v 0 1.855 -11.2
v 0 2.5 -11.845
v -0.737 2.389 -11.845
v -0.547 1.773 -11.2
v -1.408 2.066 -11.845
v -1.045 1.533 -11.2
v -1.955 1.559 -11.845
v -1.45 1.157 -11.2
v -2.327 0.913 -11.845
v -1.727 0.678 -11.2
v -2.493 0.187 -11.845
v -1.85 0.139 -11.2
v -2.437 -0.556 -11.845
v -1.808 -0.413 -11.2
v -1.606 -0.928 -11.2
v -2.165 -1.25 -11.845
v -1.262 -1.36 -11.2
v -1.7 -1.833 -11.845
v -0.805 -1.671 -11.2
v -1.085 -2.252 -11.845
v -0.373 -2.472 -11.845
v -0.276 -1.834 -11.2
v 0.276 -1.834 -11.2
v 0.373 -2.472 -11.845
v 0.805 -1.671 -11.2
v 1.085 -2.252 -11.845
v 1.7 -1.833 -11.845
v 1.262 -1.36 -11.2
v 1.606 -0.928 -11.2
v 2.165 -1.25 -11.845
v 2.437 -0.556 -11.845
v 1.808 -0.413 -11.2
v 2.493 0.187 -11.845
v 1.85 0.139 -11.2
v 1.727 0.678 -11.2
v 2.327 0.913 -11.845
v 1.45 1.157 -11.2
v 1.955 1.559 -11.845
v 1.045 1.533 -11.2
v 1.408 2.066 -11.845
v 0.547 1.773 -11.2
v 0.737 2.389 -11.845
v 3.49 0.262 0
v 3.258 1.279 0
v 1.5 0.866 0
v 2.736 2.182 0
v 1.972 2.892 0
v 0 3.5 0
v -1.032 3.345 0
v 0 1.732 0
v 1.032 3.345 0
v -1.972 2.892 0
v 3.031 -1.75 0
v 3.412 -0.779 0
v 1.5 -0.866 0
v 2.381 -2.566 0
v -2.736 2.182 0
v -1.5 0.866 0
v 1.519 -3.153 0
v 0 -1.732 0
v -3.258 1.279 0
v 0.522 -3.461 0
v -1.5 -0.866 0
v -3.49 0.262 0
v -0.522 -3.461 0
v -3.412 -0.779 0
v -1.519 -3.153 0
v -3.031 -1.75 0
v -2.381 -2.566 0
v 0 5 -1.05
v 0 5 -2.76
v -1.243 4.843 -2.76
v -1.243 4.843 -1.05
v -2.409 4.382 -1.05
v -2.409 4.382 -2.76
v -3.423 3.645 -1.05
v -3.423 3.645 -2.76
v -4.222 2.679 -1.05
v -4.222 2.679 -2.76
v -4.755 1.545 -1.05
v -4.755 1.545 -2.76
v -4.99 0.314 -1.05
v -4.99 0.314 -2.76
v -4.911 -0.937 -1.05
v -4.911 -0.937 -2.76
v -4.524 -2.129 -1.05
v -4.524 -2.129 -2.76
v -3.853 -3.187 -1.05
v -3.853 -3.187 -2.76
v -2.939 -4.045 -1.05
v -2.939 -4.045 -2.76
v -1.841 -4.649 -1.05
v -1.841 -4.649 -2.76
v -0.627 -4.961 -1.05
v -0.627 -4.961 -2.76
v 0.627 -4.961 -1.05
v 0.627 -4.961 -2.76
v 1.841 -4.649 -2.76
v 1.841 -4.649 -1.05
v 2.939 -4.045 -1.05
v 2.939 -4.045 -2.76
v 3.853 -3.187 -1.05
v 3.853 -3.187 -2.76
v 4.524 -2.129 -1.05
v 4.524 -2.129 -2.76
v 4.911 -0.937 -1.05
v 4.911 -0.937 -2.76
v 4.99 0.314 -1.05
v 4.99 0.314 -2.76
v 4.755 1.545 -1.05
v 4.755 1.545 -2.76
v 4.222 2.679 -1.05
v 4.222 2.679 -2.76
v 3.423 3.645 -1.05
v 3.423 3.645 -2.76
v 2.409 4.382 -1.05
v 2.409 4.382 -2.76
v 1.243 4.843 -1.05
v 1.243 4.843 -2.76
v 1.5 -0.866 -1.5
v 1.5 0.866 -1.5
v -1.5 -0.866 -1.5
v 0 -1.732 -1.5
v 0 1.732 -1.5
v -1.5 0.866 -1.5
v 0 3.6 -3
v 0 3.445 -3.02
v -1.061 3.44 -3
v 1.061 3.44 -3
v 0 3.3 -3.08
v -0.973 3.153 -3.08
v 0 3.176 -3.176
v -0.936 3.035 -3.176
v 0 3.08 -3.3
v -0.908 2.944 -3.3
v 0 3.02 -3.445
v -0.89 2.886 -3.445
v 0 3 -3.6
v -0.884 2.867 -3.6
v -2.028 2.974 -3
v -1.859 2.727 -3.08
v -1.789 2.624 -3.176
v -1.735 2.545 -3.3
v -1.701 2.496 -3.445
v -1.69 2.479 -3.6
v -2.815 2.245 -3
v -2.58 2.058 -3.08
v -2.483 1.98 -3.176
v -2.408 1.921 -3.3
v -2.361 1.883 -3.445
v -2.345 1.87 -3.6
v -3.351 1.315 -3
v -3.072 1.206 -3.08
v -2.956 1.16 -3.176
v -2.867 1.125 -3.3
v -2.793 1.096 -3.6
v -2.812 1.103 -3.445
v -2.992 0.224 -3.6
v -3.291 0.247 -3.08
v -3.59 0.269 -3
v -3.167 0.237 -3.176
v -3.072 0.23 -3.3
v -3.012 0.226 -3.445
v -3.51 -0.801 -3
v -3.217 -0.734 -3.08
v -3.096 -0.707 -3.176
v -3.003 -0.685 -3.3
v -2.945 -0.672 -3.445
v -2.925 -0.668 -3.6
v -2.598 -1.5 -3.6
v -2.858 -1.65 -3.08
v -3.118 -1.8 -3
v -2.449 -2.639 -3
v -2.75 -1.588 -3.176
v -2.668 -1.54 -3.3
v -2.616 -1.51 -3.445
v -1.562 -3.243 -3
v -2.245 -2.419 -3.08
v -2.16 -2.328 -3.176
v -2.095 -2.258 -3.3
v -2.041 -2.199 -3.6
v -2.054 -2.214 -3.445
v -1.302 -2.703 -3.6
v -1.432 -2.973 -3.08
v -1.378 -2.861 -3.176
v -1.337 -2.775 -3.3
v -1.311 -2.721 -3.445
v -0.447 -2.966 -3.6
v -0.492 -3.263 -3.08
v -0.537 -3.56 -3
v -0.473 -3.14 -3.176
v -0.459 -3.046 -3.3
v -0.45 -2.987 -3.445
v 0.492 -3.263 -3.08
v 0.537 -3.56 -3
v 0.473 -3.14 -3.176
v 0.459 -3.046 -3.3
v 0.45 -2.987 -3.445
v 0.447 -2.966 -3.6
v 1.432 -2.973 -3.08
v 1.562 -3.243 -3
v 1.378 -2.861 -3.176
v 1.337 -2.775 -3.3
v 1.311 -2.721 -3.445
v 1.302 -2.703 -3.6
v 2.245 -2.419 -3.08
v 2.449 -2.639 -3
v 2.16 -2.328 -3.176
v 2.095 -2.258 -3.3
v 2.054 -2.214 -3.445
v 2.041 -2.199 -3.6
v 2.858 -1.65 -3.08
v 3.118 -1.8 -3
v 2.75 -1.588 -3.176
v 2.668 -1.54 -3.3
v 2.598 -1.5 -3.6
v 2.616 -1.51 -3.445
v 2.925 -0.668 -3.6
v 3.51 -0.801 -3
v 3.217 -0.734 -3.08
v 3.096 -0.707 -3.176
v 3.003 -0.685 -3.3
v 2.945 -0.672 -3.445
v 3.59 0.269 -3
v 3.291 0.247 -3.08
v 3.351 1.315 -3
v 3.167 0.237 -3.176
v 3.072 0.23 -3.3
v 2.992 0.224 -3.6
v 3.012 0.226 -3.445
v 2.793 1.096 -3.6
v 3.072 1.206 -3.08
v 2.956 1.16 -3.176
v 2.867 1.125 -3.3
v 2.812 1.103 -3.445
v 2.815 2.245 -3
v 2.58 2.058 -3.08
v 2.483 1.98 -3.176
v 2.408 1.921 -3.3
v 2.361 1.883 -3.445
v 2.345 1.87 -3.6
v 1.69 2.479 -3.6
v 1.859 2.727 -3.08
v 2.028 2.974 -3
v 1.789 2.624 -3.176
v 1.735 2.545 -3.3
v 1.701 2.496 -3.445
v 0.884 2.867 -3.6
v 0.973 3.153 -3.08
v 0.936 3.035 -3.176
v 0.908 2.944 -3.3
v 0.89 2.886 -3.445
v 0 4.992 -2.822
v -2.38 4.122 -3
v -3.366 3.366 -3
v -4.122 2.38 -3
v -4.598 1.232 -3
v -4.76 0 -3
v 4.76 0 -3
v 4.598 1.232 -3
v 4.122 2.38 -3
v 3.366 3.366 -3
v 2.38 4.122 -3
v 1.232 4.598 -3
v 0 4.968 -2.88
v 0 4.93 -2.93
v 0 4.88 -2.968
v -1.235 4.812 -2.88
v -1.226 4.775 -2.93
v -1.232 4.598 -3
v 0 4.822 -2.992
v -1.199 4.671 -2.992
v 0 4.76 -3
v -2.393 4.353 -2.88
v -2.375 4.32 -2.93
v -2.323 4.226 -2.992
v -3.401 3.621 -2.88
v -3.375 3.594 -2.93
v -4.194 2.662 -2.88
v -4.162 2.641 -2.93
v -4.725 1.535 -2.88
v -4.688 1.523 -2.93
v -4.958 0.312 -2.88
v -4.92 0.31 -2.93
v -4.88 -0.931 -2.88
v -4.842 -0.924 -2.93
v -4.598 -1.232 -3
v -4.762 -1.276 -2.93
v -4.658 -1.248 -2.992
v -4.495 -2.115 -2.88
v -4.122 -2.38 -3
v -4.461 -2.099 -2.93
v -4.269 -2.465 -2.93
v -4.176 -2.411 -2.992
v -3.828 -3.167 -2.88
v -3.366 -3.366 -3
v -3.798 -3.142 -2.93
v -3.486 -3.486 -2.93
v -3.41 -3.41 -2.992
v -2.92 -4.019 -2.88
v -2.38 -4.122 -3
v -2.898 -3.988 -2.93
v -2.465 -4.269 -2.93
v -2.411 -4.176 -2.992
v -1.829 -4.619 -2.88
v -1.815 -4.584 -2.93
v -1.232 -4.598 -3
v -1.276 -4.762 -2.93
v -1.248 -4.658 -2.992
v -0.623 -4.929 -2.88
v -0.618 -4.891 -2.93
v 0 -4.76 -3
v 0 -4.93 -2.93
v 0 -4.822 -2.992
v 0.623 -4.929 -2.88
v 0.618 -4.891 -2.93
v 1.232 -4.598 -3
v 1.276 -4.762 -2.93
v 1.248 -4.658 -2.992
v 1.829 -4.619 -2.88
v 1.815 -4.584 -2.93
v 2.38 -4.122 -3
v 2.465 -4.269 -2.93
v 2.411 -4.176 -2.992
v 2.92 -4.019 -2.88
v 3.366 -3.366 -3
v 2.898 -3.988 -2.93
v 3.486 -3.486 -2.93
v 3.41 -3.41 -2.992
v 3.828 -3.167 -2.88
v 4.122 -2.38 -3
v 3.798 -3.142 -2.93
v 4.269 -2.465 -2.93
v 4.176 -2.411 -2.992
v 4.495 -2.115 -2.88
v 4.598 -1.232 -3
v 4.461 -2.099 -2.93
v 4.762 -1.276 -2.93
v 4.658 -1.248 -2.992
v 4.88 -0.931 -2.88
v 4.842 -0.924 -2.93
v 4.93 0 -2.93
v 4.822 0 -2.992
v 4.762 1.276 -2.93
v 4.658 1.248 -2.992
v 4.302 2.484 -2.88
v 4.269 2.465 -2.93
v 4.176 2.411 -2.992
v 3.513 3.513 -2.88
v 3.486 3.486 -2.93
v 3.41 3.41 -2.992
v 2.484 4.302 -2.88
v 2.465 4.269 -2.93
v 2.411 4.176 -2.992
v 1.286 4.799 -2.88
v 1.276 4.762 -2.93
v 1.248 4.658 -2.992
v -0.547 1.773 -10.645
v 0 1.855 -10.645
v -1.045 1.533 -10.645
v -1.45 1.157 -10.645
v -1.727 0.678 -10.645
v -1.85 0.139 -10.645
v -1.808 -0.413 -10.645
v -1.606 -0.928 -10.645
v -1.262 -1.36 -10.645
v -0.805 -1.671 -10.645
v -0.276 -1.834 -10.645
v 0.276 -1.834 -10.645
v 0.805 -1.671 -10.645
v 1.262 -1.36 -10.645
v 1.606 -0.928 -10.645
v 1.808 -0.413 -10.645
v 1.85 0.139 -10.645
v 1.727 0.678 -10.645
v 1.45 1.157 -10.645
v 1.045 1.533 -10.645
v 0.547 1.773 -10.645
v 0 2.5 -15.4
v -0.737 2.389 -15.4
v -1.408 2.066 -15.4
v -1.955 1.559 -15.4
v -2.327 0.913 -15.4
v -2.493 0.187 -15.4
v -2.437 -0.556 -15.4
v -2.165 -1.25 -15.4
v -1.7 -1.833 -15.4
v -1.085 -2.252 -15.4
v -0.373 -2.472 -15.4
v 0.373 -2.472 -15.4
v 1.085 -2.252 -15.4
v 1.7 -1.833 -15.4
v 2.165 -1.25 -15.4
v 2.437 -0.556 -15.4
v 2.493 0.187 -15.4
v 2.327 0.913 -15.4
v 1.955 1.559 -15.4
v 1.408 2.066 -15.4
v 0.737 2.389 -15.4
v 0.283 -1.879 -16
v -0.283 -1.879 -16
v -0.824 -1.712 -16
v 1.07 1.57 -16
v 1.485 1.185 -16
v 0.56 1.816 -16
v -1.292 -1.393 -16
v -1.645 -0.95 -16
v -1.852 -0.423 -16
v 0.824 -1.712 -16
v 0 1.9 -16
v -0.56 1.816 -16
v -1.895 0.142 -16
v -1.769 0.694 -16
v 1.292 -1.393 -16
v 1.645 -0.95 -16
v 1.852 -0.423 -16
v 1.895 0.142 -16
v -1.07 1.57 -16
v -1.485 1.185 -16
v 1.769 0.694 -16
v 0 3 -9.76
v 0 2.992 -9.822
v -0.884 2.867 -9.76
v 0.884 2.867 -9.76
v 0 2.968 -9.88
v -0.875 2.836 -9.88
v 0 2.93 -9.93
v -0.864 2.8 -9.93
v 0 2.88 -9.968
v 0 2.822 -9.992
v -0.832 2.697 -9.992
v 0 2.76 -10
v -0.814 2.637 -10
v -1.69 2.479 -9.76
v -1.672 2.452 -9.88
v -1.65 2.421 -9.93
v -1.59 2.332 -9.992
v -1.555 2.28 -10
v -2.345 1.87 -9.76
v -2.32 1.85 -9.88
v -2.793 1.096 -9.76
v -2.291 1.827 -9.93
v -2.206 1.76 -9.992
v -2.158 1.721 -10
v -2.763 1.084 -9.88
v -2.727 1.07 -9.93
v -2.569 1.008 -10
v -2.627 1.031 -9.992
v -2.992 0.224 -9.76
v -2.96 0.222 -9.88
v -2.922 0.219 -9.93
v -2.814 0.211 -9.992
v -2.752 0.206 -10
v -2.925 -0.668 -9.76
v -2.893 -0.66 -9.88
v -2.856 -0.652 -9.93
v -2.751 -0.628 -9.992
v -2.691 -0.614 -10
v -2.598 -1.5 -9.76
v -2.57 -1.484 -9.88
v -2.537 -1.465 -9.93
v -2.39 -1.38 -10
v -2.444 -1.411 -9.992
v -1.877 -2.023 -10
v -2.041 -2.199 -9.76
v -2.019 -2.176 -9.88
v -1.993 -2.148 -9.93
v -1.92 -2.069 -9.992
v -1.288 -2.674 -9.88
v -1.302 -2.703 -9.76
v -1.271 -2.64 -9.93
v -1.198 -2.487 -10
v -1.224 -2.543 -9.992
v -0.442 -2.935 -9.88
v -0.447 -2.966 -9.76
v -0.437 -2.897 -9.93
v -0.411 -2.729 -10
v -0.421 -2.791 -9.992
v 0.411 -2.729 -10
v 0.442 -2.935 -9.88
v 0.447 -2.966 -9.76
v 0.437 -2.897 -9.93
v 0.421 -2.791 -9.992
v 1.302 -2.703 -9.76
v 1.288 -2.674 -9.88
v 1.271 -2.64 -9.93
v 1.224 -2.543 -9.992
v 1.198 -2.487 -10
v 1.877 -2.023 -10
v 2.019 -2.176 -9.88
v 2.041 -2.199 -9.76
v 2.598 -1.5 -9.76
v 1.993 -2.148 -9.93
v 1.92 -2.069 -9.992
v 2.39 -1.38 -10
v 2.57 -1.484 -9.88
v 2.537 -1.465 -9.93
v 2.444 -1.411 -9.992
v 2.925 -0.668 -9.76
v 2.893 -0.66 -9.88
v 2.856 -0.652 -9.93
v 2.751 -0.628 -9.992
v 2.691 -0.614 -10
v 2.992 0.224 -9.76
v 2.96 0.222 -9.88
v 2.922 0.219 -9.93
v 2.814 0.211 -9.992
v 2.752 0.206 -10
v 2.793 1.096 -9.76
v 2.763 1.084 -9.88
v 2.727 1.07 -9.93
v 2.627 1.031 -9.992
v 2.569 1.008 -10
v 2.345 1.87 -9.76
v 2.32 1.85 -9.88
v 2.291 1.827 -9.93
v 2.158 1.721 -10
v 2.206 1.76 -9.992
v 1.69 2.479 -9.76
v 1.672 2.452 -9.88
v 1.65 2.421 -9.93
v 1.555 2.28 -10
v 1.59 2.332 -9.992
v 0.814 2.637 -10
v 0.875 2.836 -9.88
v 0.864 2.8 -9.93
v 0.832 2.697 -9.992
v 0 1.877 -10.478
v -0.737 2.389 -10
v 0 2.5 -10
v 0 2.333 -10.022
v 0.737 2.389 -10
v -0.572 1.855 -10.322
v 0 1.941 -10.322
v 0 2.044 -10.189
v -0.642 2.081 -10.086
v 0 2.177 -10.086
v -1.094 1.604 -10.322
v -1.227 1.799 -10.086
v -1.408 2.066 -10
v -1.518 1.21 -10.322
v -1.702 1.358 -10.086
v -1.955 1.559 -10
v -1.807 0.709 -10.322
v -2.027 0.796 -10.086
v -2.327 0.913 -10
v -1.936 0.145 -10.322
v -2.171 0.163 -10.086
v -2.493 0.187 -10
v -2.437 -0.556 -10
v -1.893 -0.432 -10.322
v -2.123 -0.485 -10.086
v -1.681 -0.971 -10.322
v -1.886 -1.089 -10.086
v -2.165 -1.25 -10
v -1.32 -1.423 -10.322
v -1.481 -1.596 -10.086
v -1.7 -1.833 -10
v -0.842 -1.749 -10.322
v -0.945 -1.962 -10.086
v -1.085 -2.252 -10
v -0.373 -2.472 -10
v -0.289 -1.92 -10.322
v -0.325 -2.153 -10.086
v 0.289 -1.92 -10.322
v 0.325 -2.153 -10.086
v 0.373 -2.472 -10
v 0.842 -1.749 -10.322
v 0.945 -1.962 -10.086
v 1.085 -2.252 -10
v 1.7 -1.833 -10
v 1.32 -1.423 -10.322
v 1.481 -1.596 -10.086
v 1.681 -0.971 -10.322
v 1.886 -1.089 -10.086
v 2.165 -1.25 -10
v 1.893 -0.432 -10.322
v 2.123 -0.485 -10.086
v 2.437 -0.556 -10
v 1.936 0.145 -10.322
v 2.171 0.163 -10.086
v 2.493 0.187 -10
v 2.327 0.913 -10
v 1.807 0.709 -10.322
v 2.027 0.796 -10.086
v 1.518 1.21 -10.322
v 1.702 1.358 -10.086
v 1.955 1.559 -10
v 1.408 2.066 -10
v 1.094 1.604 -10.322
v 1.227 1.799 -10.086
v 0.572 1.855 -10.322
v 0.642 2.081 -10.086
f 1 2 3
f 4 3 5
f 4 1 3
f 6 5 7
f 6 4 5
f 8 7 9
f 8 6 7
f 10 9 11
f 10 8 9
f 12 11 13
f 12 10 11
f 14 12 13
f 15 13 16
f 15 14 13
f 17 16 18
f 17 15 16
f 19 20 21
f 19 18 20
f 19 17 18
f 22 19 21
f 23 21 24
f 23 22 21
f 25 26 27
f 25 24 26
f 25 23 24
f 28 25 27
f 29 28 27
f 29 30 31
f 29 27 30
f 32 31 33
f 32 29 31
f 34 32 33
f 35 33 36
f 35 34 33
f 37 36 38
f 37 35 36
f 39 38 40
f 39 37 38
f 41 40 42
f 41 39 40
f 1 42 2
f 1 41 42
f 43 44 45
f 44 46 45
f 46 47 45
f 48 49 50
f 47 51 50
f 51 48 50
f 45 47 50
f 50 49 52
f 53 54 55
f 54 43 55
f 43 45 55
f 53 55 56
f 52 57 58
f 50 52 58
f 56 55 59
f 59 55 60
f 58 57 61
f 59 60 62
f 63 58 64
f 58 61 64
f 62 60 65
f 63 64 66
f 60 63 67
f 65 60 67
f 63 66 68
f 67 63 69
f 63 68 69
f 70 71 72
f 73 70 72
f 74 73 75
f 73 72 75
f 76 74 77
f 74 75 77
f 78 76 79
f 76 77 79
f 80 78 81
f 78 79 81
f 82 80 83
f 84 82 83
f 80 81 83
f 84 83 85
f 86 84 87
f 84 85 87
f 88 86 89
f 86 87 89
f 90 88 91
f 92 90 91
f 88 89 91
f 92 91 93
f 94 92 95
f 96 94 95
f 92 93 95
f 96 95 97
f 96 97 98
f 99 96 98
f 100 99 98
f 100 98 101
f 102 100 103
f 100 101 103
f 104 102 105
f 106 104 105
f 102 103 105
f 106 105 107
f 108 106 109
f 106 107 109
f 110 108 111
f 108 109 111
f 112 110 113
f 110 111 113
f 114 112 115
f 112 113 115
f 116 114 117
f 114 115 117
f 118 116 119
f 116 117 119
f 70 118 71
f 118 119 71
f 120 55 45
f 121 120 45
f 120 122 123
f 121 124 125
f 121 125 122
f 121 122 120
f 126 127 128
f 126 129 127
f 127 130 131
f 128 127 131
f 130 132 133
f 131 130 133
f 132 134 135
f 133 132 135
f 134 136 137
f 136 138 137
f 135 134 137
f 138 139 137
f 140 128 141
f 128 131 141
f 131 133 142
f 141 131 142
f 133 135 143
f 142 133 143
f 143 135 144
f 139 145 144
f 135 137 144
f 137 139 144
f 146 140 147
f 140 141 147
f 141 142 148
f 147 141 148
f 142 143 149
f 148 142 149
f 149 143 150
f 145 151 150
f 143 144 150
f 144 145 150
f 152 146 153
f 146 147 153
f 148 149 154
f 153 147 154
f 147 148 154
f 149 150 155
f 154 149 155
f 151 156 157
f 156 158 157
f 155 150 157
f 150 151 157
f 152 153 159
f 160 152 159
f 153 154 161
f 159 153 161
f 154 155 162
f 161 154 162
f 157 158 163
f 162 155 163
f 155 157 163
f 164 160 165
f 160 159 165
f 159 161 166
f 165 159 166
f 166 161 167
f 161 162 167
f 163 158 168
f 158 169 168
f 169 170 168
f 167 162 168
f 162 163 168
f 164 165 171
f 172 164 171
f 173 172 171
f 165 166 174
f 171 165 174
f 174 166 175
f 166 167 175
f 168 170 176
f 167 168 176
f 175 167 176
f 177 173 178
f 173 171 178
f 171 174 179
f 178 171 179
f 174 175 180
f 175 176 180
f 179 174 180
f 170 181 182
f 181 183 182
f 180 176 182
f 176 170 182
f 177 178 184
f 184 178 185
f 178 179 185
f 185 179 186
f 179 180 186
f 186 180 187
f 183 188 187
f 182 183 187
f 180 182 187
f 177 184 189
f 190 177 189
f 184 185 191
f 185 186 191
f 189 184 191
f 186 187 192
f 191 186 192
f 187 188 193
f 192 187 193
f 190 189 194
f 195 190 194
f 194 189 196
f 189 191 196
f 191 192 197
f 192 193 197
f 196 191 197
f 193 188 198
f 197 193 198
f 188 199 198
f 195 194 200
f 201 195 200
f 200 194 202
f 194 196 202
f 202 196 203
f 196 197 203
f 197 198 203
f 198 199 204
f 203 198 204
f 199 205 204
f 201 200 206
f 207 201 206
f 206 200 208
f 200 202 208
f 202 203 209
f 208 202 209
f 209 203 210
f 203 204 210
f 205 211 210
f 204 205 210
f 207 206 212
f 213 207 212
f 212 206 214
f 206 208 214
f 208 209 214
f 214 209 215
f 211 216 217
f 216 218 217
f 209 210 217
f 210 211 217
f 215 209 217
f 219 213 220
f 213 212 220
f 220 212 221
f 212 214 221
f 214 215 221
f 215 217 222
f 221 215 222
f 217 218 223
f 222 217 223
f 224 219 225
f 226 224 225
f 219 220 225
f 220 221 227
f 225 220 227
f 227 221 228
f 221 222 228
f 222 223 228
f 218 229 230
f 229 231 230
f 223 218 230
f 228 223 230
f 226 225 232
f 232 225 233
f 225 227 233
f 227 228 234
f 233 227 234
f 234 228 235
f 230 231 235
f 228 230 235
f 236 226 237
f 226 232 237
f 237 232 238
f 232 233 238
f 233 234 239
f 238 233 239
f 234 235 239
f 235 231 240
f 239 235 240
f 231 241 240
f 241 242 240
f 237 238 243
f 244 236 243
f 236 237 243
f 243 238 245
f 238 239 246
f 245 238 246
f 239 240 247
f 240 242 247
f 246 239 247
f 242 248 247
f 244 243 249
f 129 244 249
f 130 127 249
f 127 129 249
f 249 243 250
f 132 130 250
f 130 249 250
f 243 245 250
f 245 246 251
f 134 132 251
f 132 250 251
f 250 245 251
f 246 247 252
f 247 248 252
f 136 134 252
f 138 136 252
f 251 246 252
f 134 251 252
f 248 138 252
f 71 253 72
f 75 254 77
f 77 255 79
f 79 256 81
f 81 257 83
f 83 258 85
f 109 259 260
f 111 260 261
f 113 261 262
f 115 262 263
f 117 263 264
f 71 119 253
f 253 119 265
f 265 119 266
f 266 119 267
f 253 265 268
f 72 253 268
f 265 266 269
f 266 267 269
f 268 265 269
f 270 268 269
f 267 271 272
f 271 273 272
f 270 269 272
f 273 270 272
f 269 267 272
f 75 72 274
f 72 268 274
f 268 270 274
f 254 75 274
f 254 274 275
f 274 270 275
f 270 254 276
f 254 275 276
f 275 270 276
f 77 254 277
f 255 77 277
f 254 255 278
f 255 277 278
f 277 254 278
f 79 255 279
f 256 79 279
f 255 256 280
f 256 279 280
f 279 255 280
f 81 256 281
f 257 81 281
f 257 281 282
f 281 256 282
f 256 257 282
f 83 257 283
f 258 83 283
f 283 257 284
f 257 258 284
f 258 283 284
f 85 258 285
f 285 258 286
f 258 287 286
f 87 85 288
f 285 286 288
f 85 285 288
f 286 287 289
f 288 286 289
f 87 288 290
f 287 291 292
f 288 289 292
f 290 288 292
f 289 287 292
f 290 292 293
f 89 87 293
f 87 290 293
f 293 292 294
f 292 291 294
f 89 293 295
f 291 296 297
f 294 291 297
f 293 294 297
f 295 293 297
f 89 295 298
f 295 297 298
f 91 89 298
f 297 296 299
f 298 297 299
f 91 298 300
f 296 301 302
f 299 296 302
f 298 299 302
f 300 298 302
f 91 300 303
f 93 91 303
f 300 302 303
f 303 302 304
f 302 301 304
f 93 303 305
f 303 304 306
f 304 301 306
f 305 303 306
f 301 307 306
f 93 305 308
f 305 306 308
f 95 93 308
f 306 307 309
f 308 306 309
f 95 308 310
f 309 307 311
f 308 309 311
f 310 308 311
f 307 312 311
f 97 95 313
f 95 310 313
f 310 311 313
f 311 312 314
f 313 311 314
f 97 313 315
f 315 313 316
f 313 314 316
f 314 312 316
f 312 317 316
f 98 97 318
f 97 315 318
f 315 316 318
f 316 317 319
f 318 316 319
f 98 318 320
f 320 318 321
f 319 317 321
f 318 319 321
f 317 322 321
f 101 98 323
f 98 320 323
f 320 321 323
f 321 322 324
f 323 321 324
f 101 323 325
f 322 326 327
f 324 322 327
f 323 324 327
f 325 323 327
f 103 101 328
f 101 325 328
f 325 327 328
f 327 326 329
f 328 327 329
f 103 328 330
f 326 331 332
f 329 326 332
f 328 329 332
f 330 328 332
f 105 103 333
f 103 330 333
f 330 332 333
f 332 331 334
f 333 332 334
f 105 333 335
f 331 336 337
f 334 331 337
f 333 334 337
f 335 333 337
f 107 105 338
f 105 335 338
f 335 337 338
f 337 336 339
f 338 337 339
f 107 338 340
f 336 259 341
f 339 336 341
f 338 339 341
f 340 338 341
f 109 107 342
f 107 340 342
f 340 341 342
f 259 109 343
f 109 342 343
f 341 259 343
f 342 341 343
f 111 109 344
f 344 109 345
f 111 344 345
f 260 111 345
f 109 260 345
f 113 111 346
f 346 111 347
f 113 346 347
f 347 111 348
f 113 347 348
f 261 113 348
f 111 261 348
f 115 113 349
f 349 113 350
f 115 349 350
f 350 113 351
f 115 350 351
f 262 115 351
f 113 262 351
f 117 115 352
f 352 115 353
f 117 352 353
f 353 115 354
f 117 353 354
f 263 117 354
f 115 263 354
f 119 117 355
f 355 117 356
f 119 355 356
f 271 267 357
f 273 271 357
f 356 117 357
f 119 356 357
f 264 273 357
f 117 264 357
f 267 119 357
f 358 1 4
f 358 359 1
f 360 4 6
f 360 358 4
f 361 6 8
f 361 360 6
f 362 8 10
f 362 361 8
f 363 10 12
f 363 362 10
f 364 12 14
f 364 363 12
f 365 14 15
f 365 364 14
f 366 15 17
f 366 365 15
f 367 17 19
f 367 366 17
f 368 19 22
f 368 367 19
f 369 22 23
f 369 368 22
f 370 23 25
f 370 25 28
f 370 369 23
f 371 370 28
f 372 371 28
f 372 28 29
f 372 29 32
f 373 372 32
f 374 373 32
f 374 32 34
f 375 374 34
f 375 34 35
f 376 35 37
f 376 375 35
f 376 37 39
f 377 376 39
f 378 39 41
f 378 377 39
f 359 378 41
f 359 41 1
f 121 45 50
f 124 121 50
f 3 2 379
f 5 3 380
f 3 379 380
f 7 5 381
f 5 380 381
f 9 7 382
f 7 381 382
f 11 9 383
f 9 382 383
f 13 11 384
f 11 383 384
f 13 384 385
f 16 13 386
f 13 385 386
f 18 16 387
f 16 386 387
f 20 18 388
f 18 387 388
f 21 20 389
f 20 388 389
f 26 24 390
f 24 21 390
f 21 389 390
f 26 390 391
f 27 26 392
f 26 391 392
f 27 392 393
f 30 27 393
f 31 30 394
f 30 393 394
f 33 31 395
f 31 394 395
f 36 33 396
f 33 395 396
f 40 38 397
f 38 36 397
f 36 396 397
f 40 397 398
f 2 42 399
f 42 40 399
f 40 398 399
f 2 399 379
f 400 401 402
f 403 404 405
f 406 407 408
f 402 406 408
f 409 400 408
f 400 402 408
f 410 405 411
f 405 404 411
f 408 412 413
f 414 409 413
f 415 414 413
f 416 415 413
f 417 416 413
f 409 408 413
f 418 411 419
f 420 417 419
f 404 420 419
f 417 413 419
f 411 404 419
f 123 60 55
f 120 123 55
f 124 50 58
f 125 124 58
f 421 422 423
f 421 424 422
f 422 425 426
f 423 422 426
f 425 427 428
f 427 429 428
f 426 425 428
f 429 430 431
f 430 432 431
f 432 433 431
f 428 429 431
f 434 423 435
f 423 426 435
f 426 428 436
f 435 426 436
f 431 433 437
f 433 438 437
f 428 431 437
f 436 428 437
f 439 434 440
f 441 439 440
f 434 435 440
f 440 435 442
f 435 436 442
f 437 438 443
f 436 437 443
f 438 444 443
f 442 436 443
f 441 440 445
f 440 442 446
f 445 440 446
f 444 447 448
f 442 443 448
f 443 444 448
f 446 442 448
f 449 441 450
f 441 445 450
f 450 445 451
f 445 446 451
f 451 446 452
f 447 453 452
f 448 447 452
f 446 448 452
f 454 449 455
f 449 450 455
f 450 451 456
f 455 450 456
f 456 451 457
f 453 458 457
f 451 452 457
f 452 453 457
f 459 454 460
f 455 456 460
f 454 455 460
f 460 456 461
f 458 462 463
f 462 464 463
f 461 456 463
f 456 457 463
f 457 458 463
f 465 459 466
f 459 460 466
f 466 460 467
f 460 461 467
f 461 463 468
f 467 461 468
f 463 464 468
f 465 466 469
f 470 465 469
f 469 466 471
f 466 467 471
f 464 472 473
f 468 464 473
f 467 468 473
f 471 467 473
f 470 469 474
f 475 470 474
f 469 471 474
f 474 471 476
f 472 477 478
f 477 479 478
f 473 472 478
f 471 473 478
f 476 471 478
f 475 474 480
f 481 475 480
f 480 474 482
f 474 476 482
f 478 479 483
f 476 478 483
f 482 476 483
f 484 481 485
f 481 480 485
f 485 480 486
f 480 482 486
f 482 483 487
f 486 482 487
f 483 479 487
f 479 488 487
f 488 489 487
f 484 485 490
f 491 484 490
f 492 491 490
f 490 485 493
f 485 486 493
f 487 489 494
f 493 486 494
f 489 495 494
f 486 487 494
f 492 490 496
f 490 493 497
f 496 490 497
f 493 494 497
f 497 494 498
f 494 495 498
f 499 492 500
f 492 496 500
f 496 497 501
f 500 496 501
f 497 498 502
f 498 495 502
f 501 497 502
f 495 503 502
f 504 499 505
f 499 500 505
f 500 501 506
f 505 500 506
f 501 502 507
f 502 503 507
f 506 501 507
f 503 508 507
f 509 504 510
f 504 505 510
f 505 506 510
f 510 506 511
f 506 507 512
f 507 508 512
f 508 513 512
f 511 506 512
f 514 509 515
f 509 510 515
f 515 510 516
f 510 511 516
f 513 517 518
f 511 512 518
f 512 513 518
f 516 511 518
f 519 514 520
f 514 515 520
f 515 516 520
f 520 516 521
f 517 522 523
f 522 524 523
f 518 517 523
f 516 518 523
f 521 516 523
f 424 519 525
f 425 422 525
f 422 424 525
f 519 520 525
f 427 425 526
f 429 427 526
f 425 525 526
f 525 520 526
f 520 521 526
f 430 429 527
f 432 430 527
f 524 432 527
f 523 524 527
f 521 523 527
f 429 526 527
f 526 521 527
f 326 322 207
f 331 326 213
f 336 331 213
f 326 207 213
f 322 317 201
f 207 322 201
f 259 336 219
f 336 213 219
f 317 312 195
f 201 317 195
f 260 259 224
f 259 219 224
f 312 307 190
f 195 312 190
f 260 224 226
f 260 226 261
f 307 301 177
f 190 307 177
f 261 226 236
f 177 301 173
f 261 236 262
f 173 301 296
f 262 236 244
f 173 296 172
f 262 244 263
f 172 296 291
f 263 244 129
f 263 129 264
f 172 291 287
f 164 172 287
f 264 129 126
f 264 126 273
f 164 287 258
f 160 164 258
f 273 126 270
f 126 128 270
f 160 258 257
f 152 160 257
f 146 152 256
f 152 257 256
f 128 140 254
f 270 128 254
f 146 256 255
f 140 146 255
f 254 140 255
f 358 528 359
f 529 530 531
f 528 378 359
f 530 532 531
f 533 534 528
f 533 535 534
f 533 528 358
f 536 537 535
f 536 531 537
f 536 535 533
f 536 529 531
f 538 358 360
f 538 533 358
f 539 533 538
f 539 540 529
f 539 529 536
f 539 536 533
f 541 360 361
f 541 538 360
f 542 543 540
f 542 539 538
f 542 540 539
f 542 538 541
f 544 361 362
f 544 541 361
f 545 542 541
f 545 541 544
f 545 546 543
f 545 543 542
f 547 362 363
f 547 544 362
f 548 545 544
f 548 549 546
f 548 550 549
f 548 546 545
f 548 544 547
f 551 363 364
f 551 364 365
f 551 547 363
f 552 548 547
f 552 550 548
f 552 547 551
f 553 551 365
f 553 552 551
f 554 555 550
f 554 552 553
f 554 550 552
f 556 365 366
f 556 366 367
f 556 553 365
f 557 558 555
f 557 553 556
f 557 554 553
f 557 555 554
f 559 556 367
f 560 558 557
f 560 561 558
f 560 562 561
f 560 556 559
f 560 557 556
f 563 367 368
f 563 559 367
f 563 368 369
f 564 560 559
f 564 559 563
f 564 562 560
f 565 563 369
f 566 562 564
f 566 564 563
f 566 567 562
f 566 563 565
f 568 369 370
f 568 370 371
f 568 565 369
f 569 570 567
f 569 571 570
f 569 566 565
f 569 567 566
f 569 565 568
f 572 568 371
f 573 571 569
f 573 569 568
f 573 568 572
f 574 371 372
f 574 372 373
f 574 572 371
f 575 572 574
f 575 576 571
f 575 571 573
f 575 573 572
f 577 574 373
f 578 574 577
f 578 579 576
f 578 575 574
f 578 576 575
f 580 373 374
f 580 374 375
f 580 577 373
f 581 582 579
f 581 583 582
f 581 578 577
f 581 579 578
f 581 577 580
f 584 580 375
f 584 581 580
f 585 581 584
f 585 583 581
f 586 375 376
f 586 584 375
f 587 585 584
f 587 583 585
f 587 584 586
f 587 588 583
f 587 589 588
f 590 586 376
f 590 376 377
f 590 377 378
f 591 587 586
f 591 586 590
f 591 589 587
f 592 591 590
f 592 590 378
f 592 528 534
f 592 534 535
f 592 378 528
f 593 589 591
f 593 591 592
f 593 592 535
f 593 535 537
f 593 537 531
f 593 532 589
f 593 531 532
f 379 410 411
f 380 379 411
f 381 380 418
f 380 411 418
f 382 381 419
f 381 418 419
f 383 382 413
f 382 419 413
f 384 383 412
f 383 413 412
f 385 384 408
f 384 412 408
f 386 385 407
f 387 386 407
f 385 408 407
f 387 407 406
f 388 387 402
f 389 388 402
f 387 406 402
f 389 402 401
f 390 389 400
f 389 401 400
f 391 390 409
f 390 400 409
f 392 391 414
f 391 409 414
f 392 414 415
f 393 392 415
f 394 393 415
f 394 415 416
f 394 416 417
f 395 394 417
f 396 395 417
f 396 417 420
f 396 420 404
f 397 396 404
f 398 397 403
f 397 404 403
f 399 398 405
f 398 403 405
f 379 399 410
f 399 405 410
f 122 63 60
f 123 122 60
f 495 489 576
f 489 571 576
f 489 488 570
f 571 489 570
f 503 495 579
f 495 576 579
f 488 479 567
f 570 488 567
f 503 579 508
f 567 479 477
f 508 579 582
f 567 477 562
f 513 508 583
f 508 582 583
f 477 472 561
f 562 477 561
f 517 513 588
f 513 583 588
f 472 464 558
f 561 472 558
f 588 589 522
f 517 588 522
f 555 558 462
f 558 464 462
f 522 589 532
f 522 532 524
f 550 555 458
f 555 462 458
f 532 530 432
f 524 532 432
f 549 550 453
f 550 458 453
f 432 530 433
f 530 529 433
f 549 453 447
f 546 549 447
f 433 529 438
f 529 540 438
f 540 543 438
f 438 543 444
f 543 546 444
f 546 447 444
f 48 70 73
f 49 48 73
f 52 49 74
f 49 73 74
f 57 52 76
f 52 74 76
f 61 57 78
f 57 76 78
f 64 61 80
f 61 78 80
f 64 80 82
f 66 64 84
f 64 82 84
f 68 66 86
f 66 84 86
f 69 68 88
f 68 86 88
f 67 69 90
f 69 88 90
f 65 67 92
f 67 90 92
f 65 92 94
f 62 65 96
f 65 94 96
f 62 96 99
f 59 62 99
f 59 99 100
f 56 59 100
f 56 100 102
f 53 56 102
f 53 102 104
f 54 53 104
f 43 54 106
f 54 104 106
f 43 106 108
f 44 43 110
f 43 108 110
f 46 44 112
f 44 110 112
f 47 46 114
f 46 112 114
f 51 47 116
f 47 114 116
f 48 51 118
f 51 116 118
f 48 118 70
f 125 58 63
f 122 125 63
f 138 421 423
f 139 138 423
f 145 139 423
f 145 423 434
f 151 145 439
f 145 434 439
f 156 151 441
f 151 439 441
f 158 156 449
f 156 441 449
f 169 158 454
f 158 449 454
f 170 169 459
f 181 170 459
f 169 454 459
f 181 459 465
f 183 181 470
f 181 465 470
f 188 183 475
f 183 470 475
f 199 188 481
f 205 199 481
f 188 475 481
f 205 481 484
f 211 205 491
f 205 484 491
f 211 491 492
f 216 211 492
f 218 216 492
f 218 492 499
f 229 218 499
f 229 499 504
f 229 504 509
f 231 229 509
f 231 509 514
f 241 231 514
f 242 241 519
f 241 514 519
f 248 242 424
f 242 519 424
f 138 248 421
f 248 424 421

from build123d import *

# Parameters (mm, degrees)
CUT_EXTRUDE2_DEPTH = 1.5
CHAMFER1_SIZE      = 0.6
CHAMFER2_SIZE      = 1.5
CHAMFER2_SIZE2     = 1.050311307
FILLET1_R          = 0.24
FILLET2_R          = 0.6


with BuildPart() as part:
    # Sketch10 → Revolve1 (revolve)
    with BuildSketch(Plane(origin=(0, 0, 0), x_dir=(0, 0, -1), z_dir=(1, 0, 0))):
        Polygon((10, 3), (10, 2.5), (16, 2.5), (16, 0), (0, 0), (0, 5), (3, 5), (3, 3), align=None)
    revolve(axis=Axis((0, 0, -16), (0, 0, 1)))

    # Sketch5 → Cut-Revolve1 (revolve, cut)
    with BuildSketch(Plane(origin=(0, 0, 0), x_dir=(0, 0, -1), z_dir=(1, 0, 0))):
        with BuildLine():
            Line((10, 3), (12.345, 3))
            Line((12.345, 3), (11.2, 1.855))
            Line((11.2, 1.855), (10.645, 1.855))
            ThreePointArc((10.645, 1.855), (10.188916126, 2.043916126), (10, 2.5))
            Line((10, 2.5), (10, 3))
        make_face()
    revolve(axis=Axis((0, 0, -16), (0, 0, 1)), mode=Mode.SUBTRACT)

    # Sketch8 → Cut-Extrude2 (cut)
    with BuildSketch(Plane.XY):
        Polygon((0, 1.732050808), (-1.5, 0.866025404), (-1.5, -0.866025404), (0, -1.732050808), (1.5, -0.866025404), (1.5, 0.866025404), align=None)
    extrude(amount=-CUT_EXTRUDE2_DEPTH, mode=Mode.SUBTRACT)

    # Chamfer1
    chamfer1_edges = [part.edges().sort_by_distance(p)[0] for p in [
        (0, -2.5, -16),
    ]]
    chamfer(chamfer1_edges, length=CHAMFER1_SIZE)

    # Chamfer2
    chamfer2_edges = [part.edges().sort_by_distance(p)[0] for p in [
        (0, -5, 0),
    ]]
    chamfer2_side = [part.faces().sort_by_distance(p)[0] for p in [
        (0, -4.858578644, 0),
    ]]
    chamfer(chamfer2_edges, length=CHAMFER2_SIZE, length2=CHAMFER2_SIZE2, reference=chamfer2_side[0])

    # Fillet1
    fillet1_edges = [part.edges().sort_by_distance(p)[0] for p in [
        (0, -5, -3),
        (0, -3, -10),
    ]]
    fillet(fillet1_edges, radius=FILLET1_R)

    # Fillet2
    fillet2_edges = [part.edges().sort_by_distance(p)[0] for p in [
        (0, -3, -3),
    ]]
    fillet(fillet2_edges, radius=FILLET2_R)


solid = part.part
